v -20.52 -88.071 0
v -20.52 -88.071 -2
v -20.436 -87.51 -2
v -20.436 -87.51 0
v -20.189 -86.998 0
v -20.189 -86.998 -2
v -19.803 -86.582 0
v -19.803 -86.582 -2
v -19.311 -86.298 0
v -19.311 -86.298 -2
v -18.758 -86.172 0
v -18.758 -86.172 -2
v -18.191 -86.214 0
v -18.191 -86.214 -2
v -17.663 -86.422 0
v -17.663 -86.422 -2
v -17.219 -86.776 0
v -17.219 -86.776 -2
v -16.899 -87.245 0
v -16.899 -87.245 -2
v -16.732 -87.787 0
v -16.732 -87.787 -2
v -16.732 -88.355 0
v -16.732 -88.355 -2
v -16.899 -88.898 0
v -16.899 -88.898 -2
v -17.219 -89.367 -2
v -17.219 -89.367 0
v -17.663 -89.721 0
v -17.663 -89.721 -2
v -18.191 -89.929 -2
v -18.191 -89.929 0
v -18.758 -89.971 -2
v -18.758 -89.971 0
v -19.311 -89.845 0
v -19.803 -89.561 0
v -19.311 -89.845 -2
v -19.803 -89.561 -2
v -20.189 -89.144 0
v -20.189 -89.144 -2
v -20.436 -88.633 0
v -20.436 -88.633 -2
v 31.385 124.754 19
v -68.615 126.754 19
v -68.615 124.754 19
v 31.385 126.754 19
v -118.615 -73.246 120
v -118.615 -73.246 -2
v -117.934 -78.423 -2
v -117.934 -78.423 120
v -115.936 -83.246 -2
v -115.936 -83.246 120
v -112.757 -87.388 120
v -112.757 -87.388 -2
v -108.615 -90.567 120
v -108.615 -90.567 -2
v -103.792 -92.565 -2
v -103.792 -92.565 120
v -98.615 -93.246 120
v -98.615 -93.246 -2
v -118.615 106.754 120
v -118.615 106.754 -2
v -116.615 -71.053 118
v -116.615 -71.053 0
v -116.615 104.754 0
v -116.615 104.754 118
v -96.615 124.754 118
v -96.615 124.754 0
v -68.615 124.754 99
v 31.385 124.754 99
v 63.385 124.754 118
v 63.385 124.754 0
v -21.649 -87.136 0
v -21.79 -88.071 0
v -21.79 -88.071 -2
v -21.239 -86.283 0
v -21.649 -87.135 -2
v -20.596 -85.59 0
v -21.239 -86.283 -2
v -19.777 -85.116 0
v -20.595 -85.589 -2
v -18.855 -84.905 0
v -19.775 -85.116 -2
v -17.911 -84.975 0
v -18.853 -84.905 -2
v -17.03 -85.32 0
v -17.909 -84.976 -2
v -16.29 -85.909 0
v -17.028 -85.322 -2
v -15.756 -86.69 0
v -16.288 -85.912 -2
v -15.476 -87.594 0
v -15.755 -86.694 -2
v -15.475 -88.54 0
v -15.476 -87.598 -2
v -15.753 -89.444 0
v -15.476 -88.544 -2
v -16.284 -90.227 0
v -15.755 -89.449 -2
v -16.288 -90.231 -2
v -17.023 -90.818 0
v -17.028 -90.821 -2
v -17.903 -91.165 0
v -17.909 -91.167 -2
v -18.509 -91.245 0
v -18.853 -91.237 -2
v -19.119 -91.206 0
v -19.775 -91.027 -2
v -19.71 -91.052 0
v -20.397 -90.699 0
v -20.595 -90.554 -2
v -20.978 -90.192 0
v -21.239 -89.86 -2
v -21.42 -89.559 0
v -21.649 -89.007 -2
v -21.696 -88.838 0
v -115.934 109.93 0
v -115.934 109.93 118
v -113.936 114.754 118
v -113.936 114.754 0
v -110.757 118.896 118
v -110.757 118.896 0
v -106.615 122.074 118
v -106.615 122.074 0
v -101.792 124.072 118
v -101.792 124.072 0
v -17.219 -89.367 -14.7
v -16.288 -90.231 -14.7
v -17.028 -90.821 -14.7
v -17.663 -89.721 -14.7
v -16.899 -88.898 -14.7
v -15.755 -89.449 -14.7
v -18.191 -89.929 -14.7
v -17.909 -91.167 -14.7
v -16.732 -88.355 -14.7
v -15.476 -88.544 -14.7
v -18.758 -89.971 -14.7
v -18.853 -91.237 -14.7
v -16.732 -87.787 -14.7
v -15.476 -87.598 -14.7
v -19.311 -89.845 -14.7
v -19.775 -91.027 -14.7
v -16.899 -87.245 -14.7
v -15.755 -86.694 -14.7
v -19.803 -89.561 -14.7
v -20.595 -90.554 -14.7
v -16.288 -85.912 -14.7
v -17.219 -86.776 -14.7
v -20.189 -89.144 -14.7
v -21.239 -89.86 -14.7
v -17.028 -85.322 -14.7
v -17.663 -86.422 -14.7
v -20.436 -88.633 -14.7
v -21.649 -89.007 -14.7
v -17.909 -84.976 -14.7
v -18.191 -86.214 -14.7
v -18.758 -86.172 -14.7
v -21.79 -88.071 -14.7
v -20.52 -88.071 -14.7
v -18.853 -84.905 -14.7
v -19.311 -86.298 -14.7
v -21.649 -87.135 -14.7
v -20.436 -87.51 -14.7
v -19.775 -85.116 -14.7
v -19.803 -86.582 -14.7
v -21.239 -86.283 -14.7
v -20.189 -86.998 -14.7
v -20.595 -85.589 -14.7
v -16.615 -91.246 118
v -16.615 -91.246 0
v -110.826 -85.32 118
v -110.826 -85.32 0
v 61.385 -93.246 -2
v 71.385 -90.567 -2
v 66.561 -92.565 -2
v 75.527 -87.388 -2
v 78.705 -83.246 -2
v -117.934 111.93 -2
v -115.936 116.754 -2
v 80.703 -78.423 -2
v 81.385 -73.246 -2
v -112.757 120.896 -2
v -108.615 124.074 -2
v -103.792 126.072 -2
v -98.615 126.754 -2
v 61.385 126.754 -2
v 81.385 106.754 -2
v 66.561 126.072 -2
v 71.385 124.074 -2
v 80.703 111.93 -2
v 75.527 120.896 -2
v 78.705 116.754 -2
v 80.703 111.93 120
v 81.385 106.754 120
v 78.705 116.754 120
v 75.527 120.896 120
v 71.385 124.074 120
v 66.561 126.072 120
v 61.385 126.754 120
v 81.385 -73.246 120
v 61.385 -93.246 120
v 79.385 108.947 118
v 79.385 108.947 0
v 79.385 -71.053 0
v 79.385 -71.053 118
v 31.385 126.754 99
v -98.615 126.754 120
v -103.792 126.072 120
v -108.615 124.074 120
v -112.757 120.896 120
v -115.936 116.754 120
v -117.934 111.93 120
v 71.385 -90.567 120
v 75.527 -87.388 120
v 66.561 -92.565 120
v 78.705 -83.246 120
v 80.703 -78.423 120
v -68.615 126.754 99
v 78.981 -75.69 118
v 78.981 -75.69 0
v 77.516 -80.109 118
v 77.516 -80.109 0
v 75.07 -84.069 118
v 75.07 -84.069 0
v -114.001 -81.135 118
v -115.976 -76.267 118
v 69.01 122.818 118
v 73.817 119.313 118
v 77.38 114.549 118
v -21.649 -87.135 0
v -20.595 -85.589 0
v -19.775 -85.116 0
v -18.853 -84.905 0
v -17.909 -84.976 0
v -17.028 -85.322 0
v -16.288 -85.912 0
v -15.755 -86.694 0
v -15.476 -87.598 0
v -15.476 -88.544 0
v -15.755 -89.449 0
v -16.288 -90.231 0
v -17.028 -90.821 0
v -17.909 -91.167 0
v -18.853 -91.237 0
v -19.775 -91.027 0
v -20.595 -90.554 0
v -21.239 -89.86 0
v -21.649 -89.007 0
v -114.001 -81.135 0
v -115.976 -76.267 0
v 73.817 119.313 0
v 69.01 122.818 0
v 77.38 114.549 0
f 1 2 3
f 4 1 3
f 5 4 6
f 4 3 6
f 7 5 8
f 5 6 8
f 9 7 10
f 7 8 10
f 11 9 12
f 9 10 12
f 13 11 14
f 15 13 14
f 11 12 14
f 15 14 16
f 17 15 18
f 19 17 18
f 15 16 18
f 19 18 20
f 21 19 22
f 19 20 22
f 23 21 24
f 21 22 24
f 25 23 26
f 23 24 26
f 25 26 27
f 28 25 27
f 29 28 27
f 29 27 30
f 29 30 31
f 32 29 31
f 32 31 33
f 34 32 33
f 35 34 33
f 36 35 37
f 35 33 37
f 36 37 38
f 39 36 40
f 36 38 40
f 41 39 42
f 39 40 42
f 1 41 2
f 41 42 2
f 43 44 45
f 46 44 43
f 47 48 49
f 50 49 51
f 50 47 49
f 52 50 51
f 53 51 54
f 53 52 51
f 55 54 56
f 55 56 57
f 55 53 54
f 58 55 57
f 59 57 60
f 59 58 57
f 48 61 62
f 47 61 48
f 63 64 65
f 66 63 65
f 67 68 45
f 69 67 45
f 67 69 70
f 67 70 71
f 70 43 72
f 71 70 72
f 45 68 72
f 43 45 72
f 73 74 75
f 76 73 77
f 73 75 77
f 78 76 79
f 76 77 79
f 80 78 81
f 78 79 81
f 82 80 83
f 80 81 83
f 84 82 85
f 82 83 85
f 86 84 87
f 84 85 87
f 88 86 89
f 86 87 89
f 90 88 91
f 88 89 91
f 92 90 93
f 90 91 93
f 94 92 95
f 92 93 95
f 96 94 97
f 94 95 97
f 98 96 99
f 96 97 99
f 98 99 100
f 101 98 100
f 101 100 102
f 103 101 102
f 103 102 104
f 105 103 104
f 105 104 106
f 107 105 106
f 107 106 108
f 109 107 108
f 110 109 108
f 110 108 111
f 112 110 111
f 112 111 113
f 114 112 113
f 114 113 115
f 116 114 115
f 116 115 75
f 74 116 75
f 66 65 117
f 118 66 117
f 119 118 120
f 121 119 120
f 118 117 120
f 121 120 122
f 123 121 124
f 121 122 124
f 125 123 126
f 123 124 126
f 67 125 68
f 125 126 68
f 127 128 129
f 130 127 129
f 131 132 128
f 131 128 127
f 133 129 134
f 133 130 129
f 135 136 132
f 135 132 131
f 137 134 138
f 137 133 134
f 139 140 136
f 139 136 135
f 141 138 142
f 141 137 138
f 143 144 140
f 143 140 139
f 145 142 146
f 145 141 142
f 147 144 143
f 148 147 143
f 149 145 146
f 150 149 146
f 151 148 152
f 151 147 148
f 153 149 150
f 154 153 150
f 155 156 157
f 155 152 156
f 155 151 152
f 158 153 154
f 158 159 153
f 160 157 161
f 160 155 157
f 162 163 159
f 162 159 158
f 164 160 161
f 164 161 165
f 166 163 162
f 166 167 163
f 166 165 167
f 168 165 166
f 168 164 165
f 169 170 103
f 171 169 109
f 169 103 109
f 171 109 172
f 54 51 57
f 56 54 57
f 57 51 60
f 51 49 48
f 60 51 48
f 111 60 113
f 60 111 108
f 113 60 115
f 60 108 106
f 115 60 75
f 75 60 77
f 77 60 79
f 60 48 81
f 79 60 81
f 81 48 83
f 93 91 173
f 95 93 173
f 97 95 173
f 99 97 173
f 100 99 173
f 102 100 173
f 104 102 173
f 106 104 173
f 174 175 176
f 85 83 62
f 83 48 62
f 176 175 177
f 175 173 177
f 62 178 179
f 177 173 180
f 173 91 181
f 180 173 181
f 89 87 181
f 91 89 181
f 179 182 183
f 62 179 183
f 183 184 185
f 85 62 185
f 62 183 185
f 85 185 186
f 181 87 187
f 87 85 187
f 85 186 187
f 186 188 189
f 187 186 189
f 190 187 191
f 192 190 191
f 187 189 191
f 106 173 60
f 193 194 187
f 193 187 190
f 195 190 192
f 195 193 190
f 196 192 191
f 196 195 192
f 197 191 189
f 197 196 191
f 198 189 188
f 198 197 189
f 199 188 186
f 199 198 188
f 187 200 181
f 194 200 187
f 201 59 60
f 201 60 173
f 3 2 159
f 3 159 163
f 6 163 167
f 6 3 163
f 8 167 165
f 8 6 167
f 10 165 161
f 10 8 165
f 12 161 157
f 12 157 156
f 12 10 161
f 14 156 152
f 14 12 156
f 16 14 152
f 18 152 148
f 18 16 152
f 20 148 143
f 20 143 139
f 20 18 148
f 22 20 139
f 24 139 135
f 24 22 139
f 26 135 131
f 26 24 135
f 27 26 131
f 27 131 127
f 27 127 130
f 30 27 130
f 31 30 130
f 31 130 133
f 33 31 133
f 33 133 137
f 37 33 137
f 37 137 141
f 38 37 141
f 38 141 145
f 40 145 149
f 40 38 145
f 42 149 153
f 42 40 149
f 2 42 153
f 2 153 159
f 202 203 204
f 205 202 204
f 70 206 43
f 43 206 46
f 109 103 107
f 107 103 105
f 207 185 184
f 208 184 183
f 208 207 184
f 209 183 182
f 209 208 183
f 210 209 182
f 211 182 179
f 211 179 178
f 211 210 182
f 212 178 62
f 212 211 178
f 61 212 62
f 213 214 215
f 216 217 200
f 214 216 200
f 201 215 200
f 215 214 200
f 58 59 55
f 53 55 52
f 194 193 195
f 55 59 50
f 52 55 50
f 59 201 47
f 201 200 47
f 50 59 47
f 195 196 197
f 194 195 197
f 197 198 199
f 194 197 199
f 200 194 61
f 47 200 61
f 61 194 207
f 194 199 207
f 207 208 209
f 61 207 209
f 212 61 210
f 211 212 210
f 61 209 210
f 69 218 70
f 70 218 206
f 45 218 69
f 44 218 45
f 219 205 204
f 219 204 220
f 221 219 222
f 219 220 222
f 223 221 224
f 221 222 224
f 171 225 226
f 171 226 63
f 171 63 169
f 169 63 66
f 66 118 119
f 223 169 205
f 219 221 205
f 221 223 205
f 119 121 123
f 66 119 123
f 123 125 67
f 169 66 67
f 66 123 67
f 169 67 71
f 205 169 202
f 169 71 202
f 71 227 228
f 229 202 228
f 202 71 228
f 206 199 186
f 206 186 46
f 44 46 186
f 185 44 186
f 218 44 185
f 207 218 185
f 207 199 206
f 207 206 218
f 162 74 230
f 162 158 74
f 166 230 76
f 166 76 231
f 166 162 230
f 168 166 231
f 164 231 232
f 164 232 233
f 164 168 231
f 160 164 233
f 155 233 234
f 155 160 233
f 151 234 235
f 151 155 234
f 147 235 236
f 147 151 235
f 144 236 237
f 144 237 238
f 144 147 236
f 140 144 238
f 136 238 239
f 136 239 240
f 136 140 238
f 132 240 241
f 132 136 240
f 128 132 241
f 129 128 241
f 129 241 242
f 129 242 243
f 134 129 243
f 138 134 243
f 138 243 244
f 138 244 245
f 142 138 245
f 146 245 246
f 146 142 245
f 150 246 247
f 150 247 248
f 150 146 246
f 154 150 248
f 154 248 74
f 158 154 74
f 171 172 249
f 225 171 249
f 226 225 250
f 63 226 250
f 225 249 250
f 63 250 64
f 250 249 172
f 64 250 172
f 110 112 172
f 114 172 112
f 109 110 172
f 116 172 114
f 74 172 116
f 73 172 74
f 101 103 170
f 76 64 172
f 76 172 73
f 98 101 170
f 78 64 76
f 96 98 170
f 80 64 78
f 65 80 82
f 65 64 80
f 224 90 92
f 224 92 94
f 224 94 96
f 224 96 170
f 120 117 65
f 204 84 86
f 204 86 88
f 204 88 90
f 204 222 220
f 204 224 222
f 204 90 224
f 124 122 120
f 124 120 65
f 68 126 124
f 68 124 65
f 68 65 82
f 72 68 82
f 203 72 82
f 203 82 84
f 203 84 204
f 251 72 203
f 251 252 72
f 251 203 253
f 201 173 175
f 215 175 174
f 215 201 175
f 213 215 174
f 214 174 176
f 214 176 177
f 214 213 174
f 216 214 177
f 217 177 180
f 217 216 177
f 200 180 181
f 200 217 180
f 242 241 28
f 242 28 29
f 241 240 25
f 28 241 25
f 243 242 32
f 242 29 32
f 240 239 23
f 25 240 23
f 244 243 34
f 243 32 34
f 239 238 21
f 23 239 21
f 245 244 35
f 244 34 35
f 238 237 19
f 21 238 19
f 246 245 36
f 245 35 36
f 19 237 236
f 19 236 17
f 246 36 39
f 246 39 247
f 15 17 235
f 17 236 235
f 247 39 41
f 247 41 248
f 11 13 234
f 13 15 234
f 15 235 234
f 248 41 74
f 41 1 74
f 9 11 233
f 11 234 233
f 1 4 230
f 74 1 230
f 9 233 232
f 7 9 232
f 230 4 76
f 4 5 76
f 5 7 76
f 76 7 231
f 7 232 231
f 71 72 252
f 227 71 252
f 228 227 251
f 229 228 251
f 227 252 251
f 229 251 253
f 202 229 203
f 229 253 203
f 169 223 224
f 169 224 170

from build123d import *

# Parameters (mm, degrees)
BOSS_EXTRUDE1_DEPTH      = 120
BOSS_EXTRUDE2_DEPTH      = 2
SKETCH4_R                = 3.175
CUT_EXTRUDE2_DEPTH       = 2
SKETCH5_W                = 100
SKETCH5_H                = 80
CUT_EXTRUDE3_DEPTH       = 2
SKETCH6_R                = 3.175
SKETCH6_R_2              = 1.905
BOSS_EXTRUDE3_DEPTH      = 12.7
BOSS_EXTRUDE3_DEPTH_BACK = 2


with BuildPart() as part:
    # Sketch1 → Boss-Extrude1 (new body)
    with BuildSketch(Plane.XY):
        with BuildLine():
            Line((-98.615233931, 126.753710538), (61.384766069, 126.753710538))
            ThreePointArc((61.384766069, 126.753710538), (75.526901693, 120.895846162), (81.384766069, 106.753710538))
            Line((81.384766069, 106.753710538), (81.384766069, -73.246289462))
            ThreePointArc((81.384766069, -73.246289462), (75.526901693, -87.388425086), (61.384766069, -93.246289462))
            Line((61.384766069, -93.246289462), (-98.615233931, -93.246289462))
            ThreePointArc((-98.615233931, -93.246289462), (-112.757369555, -87.388425086), (-118.615233931, -73.246289462))
            Line((-118.615233931, -73.246289462), (-118.615233931, 106.753710538))
            ThreePointArc((-118.615233931, 106.753710538), (-112.757369555, 120.895846162), (-98.615233931, 126.753710538))
        make_face()
        with BuildLine():
            Line((-96.615233931, 124.753710538), (63.384766069, 124.753710538))
            ThreePointArc((63.384766069, 124.753710538), (73.817087779, 119.312661776), (79.384766069, 108.947368421))
            Line((79.384766069, 108.947368421), (79.384766069, -71.052631579))
            ThreePointArc((79.384766069, -71.052631579), (78.377585569, -77.942212595), (75.069516555, -84.068991401))
            Line((75.069516555, -84.068991401), (-16.615233931, -91.246289462))
            Line((-16.615233931, -91.246289462), (-110.826280736, -85.32012324))
            ThreePointArc((-110.826280736, -85.32012324), (-115.148769435, -78.765785158), (-116.615233931, -71.052631579))
            Line((-116.615233931, -71.052631579), (-116.615233931, 104.753710538))
            ThreePointArc((-116.615233931, 104.753710538), (-110.757369555, 118.895846162), (-96.615233931, 124.753710538))
        make_face(mode=Mode.SUBTRACT)
    extrude(amount=BOSS_EXTRUDE1_DEPTH)

    # Sketch2 → Boss-Extrude2 (add)
    with BuildSketch(Plane(origin=(0, 0, 0), x_dir=(-1, 0, 0), z_dir=(0, 0, -1))):
        with BuildLine():
            Line((-81.384766069, -73.246289462), (-81.384766069, 106.753710538))
            ThreePointArc((-81.384766069, 106.753710538), (-75.526901693, 120.895846162), (-61.384766069, 126.753710538))
            Line((-61.384766069, 126.753710538), (98.615233931, 126.753710538))
            ThreePointArc((98.615233931, 126.753710538), (112.757369555, 120.895846162), (118.615233931, 106.753710538))
            Line((118.615233931, 106.753710538), (118.615233931, -73.246289462))
            ThreePointArc((118.615233931, -73.246289462), (112.757369555, -87.388425086), (98.615233931, -93.246289462))
            Line((98.615233931, -93.246289462), (-61.384766069, -93.246289462))
            ThreePointArc((-61.384766069, -93.246289462), (-75.526901693, -87.388425086), (-81.384766069, -73.246289462))
        make_face()
    boss_extrude2 = extrude(amount=BOSS_EXTRUDE2_DEPTH)

    # Mirror1: Boss-Extrude2 across plane
    add(boss_extrude2.mirror(Plane.XY.offset(59)))

    # Sketch4 → Cut-Extrude2 (cut)
    with BuildSketch(Plane(origin=(0, 0, -2), x_dir=(-1, 0, 0), z_dir=(0, 0, -1))):
        with Locations((18.615233931, -88.071289462)):
            Circle(SKETCH4_R)
    extrude(amount=-CUT_EXTRUDE2_DEPTH, mode=Mode.SUBTRACT)

    # Sketch5 → Cut-Extrude3 (cut)
    with BuildSketch(Plane(origin=(0, 126.753710538, 0), x_dir=(1, 0, 0), z_dir=(0, 1, 0))):
        with Locations((-18.615233931, -59)):
            Rectangle(SKETCH5_W, SKETCH5_H)
    extrude(amount=-CUT_EXTRUDE3_DEPTH, mode=Mode.SUBTRACT)


with BuildPart() as body_2:
    # Sketch6 → Boss-Extrude3 (new body, two sides)
    with BuildSketch(Plane(origin=(0, 0, -2), x_dir=(-1, 0, 0), z_dir=(0, 0, -1))) as boss_extrude3_sk:
        with Locations((18.615233931, -88.071289462)):
            Circle(SKETCH6_R)
        with Locations((18.615233931, -88.071289462)):
            Circle(SKETCH6_R_2, mode=Mode.SUBTRACT)
    extrude(amount=BOSS_EXTRUDE3_DEPTH)
    extrude(boss_extrude3_sk.sketch, amount=-BOSS_EXTRUDE3_DEPTH_BACK)


solid = Compound([part.part, body_2.part])
